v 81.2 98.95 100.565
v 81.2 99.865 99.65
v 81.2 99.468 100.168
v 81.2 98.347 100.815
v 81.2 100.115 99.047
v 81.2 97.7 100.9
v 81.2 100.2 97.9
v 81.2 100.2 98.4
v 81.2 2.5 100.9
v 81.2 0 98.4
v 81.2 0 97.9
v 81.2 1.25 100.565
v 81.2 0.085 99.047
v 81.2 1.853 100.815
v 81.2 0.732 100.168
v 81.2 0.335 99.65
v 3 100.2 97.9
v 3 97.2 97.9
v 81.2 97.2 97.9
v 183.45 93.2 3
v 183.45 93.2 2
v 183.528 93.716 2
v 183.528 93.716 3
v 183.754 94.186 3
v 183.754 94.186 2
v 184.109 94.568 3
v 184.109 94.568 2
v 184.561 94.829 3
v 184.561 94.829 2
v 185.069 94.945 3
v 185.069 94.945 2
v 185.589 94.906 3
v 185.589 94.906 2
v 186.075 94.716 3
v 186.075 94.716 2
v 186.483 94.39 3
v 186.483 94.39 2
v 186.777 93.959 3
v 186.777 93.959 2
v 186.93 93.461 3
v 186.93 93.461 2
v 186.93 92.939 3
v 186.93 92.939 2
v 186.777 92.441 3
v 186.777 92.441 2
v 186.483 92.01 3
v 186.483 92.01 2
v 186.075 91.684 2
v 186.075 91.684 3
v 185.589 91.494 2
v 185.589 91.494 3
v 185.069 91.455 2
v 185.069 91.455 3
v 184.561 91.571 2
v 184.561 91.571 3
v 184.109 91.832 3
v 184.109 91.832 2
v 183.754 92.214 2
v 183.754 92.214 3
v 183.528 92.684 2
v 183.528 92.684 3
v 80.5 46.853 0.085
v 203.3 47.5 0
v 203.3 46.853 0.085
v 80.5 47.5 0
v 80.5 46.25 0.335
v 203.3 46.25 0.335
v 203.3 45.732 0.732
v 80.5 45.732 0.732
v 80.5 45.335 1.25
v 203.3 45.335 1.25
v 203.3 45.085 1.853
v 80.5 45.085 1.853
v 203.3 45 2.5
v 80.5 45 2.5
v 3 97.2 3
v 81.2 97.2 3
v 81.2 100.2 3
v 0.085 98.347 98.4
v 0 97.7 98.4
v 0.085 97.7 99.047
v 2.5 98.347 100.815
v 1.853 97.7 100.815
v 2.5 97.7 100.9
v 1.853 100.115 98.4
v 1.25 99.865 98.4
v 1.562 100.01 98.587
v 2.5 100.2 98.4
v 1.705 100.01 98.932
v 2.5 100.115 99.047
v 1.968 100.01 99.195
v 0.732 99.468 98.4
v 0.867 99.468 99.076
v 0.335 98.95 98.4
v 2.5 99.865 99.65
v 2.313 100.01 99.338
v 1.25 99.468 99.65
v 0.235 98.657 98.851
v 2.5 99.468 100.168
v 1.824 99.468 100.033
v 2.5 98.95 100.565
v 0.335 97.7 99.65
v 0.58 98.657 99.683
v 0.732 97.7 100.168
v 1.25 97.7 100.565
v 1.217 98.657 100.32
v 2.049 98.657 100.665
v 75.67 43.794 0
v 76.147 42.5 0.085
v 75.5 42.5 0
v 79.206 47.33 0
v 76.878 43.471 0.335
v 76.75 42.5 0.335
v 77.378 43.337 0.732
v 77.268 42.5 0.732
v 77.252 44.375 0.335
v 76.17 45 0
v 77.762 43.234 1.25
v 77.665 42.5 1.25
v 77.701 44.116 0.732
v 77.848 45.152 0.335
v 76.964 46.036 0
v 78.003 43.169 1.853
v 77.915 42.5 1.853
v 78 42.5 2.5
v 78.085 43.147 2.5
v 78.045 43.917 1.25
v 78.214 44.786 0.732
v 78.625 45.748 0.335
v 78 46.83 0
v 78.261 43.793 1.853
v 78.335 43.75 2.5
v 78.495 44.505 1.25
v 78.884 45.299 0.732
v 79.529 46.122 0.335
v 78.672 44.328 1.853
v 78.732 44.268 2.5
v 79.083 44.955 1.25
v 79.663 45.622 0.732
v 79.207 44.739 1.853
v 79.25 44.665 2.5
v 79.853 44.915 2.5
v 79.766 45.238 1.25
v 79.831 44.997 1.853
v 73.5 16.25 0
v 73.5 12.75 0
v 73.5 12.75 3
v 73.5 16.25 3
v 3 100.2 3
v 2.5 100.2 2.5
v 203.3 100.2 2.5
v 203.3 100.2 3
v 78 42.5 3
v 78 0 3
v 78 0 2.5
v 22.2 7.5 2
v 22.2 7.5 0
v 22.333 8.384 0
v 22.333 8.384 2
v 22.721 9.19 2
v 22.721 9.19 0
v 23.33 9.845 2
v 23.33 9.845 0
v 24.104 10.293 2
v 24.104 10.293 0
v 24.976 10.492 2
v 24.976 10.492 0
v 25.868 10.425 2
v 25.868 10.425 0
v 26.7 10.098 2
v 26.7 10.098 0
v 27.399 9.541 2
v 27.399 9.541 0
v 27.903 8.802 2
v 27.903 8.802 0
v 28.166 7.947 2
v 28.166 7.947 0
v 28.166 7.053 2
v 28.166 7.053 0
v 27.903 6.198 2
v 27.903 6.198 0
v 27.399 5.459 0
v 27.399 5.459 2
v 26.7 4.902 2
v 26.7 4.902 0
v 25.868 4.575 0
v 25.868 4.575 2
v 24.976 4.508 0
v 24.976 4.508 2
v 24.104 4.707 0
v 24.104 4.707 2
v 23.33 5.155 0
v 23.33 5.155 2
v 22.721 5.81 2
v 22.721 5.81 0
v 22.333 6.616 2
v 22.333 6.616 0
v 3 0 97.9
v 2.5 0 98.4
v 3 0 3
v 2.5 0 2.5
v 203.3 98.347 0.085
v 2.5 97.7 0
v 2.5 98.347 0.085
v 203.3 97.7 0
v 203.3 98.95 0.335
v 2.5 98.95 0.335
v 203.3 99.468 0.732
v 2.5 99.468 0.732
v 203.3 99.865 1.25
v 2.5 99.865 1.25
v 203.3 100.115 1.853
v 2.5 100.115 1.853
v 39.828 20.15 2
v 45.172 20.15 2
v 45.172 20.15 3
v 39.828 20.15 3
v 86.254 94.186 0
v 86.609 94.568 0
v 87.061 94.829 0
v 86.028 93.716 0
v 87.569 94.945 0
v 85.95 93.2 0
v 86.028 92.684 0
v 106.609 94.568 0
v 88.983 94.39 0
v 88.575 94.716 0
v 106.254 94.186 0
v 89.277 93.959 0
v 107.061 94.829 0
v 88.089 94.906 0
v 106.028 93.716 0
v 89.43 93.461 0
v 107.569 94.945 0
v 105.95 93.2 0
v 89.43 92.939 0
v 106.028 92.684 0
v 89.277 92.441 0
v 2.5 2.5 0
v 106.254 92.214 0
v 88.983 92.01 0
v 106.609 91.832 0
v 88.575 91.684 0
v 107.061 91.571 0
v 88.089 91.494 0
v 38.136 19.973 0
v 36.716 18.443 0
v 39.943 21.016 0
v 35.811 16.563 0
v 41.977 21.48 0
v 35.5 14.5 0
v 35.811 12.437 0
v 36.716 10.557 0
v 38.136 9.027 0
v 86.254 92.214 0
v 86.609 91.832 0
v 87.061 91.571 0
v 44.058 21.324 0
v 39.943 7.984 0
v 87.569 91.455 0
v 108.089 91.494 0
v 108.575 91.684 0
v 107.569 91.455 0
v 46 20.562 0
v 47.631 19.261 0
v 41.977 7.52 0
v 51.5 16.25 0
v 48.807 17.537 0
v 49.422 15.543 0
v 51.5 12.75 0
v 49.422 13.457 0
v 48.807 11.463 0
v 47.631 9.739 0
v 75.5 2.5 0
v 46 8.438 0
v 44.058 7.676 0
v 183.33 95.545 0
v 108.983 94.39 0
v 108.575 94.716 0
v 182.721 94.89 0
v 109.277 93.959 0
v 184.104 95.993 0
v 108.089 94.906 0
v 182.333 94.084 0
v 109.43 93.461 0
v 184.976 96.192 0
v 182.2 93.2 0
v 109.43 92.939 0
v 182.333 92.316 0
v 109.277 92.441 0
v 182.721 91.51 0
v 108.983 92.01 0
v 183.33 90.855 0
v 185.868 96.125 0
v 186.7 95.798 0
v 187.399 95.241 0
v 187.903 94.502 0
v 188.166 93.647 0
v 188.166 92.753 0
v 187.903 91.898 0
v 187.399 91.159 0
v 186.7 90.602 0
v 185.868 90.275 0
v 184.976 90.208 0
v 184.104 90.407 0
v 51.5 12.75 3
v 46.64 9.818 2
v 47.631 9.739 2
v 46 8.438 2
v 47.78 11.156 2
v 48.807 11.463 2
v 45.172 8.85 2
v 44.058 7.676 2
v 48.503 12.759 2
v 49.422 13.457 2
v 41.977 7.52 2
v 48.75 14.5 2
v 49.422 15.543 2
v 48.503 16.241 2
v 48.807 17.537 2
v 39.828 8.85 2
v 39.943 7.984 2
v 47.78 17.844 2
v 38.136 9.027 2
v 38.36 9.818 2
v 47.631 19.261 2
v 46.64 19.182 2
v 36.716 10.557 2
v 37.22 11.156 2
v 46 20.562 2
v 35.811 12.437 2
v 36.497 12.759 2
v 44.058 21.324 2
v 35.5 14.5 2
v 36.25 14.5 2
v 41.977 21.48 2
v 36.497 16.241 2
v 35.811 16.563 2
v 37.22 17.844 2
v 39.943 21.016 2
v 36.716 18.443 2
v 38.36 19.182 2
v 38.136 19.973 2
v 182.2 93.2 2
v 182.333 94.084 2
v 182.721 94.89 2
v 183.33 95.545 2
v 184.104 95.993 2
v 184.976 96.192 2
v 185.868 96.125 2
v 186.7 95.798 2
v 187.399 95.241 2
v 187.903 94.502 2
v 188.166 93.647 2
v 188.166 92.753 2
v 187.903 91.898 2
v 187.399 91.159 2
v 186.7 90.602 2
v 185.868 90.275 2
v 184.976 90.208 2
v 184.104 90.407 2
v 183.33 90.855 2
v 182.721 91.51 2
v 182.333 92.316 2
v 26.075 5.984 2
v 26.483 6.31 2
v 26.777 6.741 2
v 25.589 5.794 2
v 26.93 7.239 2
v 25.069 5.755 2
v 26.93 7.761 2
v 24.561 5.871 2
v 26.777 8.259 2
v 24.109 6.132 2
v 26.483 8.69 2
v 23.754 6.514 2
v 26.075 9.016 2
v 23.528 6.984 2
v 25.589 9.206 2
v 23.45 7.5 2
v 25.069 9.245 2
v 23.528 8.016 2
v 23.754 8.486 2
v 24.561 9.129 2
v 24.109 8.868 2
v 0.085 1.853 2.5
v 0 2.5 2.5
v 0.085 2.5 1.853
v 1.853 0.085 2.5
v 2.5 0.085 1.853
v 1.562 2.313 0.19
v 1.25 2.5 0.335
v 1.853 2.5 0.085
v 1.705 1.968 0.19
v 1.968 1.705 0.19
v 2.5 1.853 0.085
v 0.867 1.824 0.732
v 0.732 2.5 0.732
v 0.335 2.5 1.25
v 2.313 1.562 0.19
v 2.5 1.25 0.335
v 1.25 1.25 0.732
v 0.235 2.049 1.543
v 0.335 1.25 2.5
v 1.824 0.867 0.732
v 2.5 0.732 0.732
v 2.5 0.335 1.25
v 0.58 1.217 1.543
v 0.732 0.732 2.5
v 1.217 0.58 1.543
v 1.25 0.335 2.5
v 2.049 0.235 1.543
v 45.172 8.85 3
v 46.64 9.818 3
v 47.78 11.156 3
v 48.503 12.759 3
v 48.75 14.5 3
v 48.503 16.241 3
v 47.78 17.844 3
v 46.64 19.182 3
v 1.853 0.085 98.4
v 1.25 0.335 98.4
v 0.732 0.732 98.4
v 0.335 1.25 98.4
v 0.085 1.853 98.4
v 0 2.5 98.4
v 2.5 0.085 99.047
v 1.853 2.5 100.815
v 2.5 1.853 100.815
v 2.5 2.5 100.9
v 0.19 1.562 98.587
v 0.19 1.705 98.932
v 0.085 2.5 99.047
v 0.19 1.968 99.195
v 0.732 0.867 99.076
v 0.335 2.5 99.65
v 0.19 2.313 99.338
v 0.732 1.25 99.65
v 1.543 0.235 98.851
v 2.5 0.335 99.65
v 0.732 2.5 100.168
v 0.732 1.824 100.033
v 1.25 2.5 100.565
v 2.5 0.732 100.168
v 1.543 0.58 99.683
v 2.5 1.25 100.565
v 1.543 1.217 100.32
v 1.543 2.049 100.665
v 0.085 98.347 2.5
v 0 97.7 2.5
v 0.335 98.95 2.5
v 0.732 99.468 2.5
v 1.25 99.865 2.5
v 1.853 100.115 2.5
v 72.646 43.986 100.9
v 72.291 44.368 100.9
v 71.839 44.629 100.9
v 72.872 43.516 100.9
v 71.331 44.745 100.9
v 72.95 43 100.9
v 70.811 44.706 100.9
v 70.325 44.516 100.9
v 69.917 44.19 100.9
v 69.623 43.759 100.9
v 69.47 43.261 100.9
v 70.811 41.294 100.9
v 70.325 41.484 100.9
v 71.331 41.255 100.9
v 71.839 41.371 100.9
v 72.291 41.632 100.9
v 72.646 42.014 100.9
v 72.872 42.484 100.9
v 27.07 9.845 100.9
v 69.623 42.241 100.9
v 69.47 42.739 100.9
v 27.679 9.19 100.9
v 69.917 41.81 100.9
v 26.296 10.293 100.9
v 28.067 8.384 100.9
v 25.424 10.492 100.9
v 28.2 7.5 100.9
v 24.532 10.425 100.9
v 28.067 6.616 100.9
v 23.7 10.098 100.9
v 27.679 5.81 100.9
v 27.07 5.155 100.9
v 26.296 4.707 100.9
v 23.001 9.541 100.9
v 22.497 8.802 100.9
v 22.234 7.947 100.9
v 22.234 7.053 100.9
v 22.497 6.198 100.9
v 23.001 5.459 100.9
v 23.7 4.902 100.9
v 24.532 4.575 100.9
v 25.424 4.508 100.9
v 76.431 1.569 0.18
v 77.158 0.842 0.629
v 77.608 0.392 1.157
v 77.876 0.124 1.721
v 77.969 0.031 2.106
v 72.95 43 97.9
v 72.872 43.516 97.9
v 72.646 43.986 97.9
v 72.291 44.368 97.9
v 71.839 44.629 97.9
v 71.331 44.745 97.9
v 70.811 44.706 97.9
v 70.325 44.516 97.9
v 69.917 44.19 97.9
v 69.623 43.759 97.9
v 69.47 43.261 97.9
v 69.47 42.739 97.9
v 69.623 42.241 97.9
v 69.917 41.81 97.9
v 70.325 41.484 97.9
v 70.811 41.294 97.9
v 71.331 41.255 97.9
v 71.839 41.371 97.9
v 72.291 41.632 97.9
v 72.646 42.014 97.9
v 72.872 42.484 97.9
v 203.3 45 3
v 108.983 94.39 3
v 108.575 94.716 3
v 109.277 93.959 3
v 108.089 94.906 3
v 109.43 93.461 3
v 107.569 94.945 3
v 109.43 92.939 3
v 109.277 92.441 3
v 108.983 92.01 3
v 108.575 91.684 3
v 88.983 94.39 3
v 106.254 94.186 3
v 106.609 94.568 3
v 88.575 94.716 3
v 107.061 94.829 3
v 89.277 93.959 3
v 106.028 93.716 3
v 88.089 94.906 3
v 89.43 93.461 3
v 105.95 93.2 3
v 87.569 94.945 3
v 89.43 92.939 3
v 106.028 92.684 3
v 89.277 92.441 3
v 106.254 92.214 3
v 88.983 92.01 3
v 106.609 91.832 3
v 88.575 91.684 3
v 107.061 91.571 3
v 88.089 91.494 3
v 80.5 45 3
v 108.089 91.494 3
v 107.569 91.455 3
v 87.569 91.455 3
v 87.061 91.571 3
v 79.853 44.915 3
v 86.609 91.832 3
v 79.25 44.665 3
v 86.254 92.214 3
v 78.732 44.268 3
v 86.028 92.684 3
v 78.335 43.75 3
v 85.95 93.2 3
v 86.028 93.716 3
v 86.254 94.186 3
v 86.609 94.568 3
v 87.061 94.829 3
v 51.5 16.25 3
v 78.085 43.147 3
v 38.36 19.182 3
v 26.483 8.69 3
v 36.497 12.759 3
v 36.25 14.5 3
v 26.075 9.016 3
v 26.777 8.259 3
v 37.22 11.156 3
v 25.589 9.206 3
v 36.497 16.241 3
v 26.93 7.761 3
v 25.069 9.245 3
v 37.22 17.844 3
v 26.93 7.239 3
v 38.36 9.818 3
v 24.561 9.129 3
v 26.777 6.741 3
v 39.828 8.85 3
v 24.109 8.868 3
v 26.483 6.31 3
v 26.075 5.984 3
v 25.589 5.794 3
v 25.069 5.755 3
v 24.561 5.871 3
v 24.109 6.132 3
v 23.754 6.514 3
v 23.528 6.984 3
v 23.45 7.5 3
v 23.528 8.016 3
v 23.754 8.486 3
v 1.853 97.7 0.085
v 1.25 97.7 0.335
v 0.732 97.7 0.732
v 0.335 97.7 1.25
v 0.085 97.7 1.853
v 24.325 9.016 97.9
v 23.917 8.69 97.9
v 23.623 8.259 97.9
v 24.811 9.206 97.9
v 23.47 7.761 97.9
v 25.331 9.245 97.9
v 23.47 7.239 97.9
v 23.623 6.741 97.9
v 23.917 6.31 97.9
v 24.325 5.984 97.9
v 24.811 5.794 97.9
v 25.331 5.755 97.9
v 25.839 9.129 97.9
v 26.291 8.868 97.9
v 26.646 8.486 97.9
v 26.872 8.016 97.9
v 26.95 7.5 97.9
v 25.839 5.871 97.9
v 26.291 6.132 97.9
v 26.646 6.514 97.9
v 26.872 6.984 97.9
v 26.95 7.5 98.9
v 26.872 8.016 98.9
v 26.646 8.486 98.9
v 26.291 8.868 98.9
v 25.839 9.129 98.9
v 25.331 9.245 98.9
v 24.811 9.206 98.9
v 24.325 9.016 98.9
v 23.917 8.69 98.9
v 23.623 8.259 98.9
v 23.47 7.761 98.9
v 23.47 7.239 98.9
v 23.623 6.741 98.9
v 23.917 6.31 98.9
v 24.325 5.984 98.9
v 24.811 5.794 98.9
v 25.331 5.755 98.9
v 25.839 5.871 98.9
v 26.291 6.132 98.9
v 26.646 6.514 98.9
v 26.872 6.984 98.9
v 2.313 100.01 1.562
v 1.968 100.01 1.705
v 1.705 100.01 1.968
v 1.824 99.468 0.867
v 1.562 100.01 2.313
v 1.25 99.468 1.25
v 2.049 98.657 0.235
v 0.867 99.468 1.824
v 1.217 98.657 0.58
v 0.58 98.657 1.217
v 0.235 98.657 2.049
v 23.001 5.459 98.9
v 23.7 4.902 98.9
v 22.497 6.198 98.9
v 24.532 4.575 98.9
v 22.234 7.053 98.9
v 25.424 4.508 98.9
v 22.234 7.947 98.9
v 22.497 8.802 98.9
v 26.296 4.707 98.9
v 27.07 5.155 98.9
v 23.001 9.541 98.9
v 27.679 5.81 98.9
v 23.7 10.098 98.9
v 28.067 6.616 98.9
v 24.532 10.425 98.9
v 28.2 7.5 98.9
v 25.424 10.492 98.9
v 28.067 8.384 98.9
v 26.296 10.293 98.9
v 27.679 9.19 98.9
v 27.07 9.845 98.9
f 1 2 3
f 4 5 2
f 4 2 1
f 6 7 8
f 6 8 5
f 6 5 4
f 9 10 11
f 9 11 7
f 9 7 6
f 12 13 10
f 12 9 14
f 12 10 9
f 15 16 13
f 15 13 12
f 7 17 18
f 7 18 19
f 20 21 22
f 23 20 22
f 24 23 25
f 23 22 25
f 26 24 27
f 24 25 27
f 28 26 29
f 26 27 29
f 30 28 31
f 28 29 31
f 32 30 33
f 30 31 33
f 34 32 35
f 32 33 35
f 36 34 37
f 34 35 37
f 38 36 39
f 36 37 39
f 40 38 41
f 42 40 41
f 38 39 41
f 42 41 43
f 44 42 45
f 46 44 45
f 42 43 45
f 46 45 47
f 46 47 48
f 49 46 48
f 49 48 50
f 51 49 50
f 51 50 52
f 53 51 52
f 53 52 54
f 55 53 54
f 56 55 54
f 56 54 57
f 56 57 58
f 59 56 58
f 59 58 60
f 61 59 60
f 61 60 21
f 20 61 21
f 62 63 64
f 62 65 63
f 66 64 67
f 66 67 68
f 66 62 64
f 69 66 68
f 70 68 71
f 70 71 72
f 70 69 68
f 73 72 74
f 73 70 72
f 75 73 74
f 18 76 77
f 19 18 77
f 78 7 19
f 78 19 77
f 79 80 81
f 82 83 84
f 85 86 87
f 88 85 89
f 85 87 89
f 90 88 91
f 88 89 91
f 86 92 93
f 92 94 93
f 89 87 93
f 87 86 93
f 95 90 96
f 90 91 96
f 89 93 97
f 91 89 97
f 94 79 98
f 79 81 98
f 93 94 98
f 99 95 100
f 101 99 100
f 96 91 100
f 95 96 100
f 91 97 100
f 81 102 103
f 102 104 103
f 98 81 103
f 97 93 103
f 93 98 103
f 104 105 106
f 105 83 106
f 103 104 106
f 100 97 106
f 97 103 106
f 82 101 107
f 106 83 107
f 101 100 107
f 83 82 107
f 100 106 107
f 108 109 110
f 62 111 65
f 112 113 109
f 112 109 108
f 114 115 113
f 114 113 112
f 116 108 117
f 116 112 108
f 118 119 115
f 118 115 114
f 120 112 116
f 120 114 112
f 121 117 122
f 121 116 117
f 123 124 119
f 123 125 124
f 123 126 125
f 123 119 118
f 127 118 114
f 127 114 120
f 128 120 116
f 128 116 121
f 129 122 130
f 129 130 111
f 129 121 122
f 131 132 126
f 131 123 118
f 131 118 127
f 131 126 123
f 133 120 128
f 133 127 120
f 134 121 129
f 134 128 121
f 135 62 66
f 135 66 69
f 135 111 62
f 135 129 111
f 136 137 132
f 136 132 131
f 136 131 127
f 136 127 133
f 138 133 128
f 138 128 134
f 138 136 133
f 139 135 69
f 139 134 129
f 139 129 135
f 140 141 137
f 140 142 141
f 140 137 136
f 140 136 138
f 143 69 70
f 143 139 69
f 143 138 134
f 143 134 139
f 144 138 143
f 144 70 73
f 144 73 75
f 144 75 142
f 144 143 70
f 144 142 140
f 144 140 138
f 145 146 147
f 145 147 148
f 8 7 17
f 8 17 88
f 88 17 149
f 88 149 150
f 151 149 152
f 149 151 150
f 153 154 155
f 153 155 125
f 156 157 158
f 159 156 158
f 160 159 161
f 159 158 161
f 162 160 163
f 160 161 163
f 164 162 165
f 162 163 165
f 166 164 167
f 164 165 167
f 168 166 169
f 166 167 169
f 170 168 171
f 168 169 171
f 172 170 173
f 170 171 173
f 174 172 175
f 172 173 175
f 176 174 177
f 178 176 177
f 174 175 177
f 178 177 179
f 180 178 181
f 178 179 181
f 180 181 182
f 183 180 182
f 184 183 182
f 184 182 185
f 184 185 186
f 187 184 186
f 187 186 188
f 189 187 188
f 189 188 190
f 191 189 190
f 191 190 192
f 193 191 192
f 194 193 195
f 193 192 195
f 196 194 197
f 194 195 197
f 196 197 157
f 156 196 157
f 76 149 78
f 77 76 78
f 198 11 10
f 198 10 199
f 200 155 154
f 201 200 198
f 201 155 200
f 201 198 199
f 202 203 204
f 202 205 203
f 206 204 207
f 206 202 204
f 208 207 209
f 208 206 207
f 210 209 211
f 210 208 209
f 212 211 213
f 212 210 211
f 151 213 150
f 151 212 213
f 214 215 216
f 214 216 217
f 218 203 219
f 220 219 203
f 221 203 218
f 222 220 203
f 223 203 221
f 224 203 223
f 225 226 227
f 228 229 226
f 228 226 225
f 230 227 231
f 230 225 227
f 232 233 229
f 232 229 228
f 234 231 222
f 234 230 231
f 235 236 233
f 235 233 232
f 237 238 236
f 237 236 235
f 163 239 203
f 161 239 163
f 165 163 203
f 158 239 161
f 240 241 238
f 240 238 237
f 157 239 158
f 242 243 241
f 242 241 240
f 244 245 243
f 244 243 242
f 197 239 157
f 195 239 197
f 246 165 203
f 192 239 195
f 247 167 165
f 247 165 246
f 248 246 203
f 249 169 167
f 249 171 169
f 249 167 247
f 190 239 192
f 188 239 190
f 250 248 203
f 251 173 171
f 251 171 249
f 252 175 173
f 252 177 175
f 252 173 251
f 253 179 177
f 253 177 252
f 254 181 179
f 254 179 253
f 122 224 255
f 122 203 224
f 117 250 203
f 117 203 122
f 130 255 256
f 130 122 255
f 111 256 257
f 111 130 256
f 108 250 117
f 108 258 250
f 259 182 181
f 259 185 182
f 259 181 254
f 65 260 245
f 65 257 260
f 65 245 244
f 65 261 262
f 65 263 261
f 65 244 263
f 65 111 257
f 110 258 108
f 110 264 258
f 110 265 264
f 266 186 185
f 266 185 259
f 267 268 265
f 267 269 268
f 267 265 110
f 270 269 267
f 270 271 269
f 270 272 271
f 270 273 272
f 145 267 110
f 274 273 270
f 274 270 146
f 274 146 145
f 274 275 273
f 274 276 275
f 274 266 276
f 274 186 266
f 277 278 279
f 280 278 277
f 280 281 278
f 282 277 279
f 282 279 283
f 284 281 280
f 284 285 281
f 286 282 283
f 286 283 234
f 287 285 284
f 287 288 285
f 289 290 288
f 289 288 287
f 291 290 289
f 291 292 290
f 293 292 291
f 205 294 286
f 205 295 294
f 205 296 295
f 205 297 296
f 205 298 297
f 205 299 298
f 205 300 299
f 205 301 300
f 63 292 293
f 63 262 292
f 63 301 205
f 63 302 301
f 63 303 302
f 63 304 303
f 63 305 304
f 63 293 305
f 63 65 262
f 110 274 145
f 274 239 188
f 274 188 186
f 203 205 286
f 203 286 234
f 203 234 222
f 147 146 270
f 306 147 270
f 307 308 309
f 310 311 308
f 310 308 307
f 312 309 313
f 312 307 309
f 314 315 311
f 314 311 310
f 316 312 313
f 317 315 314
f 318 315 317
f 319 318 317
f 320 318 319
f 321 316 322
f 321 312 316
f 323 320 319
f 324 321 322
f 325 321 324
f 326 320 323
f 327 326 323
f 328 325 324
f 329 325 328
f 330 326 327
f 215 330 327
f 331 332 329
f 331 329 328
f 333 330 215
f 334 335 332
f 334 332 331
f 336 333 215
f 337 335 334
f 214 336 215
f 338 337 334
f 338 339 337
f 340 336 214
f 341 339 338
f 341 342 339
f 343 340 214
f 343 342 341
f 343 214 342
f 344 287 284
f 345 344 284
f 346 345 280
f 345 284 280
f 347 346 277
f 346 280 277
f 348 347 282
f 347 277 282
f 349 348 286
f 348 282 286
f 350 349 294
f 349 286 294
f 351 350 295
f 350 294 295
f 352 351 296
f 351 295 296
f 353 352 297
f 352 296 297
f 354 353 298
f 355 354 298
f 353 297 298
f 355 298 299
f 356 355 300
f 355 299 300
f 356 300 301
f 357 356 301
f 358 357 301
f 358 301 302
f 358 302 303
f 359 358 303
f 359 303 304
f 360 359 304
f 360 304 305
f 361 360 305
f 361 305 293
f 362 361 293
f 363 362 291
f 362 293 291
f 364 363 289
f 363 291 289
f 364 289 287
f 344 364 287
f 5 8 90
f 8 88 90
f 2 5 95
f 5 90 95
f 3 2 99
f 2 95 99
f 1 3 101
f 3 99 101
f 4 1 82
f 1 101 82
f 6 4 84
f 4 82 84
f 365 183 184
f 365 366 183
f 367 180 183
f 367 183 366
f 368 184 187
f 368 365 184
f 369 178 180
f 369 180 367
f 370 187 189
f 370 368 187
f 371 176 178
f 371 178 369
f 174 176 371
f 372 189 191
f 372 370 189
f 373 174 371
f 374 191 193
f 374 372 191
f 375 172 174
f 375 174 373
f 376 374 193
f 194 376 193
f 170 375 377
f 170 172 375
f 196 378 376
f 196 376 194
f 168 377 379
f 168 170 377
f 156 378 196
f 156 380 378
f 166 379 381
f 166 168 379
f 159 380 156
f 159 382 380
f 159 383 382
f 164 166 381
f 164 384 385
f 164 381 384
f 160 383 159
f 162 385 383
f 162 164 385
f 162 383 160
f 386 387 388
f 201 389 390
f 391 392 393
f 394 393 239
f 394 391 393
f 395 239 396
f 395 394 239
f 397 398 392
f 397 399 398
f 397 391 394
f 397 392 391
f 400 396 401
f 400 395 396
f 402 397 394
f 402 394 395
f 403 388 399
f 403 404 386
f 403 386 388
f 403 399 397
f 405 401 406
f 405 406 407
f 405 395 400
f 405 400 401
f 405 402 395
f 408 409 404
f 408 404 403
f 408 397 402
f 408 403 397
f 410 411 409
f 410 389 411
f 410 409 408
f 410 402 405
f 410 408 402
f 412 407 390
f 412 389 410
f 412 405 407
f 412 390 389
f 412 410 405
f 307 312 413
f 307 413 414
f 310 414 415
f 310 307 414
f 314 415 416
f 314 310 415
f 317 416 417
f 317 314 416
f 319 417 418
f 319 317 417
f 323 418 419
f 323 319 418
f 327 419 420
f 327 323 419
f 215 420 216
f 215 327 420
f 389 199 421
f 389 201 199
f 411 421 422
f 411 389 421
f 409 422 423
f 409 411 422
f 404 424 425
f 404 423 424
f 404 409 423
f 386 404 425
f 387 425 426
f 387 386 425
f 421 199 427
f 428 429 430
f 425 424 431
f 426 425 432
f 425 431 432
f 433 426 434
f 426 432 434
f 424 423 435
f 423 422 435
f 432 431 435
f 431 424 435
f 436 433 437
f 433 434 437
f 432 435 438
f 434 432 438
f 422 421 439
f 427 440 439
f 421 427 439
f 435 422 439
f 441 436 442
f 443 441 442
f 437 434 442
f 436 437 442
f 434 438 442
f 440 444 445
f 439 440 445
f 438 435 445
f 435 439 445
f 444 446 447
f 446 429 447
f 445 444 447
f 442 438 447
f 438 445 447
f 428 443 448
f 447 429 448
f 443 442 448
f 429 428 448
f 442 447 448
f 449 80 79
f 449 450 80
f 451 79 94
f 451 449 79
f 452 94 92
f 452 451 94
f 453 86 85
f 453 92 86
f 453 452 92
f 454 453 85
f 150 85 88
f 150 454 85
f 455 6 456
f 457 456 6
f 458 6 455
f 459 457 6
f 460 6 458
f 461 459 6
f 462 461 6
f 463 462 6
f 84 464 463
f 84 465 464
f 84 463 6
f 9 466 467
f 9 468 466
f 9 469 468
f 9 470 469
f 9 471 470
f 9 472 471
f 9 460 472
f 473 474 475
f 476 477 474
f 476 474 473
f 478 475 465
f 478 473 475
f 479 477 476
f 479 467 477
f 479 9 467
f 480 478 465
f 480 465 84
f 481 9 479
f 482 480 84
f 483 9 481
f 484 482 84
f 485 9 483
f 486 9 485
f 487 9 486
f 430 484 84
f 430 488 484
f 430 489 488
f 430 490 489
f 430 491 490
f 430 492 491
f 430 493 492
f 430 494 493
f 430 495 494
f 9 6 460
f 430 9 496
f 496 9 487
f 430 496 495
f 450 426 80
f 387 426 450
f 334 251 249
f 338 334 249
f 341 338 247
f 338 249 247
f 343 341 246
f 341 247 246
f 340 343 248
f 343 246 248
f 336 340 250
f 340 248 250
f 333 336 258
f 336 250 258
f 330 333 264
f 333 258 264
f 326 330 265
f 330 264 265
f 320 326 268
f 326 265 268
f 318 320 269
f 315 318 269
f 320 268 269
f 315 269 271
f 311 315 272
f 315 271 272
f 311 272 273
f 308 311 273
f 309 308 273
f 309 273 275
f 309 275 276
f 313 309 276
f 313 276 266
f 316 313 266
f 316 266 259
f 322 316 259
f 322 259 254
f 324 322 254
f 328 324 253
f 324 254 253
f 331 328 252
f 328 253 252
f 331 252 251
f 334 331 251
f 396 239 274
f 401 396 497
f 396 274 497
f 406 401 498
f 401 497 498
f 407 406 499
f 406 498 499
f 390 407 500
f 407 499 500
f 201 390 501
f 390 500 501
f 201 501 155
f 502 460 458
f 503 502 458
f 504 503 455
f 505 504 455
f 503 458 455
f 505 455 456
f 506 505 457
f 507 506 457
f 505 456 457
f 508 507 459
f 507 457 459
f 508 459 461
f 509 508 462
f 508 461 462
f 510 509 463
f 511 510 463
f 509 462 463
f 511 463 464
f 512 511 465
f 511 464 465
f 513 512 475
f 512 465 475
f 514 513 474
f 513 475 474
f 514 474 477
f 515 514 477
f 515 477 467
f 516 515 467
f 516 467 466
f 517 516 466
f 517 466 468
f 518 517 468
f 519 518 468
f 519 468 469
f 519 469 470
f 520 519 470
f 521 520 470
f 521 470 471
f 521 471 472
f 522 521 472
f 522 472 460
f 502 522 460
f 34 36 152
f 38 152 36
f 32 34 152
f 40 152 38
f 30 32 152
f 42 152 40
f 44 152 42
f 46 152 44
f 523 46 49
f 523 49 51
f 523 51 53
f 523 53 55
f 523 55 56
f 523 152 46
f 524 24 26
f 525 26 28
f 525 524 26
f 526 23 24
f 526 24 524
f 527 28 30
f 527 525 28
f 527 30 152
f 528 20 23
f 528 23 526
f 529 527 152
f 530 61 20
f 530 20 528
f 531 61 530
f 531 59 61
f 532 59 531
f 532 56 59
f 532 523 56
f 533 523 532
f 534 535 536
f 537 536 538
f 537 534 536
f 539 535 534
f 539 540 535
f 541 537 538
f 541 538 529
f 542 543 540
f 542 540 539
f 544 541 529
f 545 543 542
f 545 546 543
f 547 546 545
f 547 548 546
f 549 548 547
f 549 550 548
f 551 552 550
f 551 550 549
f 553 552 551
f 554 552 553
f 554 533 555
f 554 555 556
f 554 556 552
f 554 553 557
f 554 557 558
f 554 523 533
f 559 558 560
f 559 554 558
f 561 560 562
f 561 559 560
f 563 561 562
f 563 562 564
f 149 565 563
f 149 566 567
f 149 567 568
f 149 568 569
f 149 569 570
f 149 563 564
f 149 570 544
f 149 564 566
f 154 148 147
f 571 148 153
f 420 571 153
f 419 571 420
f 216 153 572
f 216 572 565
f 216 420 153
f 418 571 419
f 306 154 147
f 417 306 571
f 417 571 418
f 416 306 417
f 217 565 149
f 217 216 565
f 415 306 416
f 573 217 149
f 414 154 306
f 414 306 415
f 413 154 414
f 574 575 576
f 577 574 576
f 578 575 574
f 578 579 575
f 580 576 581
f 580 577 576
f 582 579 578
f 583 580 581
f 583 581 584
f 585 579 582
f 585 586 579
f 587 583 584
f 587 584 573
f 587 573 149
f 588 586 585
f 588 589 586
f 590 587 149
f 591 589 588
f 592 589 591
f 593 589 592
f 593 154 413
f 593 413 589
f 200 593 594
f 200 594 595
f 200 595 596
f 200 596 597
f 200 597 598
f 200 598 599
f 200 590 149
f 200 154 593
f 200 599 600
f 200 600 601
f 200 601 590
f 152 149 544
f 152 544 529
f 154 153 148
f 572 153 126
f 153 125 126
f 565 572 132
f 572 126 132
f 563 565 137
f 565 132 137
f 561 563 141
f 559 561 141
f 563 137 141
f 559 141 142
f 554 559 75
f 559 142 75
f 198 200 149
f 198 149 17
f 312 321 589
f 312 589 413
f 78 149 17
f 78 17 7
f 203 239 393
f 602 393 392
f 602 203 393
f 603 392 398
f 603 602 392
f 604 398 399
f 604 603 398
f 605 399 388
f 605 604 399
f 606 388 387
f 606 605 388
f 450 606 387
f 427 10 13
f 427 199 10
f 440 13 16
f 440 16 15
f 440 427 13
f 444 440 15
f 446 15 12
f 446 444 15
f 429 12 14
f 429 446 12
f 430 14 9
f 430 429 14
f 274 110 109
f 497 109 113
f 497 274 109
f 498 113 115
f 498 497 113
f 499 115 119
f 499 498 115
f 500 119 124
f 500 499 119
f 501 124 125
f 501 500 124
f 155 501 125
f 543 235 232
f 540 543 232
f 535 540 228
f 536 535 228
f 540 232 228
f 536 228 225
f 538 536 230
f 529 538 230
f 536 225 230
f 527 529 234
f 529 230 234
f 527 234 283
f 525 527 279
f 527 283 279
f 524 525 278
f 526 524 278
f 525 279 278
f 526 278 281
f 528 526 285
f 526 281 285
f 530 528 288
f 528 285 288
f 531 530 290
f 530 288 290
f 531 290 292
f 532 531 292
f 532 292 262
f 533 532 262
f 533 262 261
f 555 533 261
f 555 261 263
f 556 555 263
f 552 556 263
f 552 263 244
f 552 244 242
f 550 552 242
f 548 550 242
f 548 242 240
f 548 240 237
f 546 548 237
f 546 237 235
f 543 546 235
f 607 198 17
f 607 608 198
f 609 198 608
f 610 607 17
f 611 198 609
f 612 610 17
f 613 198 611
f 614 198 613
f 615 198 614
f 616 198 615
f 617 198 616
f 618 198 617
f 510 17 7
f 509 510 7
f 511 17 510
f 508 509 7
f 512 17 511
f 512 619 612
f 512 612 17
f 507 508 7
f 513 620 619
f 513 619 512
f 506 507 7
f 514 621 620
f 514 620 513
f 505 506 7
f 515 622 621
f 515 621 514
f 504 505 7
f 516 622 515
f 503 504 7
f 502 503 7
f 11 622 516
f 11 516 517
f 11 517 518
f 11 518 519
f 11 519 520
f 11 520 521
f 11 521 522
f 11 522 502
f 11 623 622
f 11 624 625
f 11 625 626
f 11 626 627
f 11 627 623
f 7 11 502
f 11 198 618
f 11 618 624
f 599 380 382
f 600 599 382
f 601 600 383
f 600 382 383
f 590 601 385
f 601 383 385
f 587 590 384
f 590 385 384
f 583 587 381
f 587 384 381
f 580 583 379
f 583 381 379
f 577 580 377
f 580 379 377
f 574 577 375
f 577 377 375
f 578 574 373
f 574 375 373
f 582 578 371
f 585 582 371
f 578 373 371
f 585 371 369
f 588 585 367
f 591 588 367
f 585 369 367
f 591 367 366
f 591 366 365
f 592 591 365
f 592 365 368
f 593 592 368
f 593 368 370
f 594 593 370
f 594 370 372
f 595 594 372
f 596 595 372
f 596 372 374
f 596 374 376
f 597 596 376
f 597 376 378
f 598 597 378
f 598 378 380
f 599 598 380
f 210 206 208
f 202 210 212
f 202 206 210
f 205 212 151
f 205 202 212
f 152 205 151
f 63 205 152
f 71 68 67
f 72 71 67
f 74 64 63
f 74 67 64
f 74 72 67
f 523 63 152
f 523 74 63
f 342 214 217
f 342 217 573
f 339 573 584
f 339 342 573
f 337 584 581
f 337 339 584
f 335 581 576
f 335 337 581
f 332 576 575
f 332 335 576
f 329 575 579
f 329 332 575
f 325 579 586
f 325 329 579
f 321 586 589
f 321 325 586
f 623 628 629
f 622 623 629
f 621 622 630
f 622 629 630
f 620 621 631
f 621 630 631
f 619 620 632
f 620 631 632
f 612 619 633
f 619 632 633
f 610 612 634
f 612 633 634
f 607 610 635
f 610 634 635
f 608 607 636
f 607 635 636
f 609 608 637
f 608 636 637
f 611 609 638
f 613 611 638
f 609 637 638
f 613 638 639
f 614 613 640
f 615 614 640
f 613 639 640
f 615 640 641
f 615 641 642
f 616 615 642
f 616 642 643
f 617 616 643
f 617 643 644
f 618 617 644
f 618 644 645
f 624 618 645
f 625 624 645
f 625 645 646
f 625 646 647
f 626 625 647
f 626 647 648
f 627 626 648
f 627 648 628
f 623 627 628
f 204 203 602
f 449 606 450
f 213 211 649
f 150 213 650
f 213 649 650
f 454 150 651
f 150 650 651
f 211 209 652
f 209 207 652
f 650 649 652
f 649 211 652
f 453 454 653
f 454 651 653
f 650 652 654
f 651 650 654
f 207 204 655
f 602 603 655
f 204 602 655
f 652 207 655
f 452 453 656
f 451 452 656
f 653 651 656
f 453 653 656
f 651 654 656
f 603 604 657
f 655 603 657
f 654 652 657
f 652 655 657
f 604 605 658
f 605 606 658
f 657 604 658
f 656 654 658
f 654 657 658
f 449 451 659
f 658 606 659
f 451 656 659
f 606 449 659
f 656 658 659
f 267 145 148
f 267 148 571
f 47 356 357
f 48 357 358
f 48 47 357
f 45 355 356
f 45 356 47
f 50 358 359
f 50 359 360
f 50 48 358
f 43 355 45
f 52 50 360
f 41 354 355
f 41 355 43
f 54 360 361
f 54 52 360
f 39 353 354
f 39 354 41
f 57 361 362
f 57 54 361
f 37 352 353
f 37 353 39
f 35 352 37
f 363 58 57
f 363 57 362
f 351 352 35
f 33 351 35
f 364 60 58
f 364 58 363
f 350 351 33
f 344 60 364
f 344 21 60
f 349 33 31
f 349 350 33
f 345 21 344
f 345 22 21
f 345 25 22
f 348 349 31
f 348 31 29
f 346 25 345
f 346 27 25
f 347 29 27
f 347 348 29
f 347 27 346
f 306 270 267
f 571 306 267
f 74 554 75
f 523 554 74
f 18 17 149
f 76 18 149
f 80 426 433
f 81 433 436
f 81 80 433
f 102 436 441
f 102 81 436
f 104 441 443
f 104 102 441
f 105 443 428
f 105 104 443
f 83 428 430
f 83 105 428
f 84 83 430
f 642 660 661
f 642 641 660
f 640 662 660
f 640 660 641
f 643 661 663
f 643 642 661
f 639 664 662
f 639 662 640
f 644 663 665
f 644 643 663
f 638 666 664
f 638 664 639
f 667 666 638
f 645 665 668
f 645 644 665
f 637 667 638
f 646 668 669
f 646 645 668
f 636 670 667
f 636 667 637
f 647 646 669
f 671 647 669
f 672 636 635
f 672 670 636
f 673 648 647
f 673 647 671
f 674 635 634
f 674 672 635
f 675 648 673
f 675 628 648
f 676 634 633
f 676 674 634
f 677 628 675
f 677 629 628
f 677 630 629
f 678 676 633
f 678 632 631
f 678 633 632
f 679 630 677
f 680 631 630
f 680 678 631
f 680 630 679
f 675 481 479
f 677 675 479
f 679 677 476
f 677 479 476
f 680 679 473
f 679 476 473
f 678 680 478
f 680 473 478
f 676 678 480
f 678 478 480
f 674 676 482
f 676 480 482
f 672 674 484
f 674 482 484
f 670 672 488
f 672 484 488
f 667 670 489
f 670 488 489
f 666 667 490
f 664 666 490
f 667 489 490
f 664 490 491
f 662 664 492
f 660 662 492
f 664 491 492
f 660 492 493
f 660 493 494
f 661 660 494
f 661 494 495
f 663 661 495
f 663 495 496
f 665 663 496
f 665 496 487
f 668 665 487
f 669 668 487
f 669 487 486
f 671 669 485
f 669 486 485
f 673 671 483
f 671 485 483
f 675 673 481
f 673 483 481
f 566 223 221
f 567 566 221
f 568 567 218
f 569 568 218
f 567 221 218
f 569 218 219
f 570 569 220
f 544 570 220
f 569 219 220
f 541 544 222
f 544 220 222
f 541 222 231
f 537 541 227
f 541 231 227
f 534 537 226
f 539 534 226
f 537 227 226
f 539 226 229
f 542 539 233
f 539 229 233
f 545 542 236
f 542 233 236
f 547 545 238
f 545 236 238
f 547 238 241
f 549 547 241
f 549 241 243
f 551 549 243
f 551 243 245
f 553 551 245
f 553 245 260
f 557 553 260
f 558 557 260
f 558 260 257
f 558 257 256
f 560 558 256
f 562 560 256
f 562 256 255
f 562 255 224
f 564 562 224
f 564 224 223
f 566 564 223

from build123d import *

# Parameters (mm, degrees)
MAIN_BODY_DEPTH                  = 100.2
SKETCH5_R                        = 1.75
BACK_SCREW_HOLES_DEPTH           = 10
SKETCH12_R                       = 3
BACK_SCREW_HEADS_DEPTH           = 2
SKETCH6_W                        = 220
SKETCH6_H                        = 45
PAPER_THROUGH_HOLE_DEPTH         = 10
SKETCH7_R                        = 1.75
FRONT_LEFT_SCREW_HOLE_DEPTH      = 10
SKETCH8_R                        = 3
FRONT_LEFT_SCREW_HEAD_DEPTH      = 2
SKETCH9_W                        = 78.2
SKETCH9_H                        = 94.9
BOSS_EXTRUDE1_DEPTH              = 3
SKETCH10_R                       = 1.75
HINGE_HOLES_DEPTH                = 10
SKETCH11_R                       = 1.75
LATCH_HOLE_DEPTH                 = 10
FILLET3_R                        = 2.5
SKETCH13_R                       = 7
BARRE_JACK_OUTER_CUTOUT_DEPTH    = 2
BARREL_JACK_INNER_CUTOUT_DEPTH   = 1
SKETCH15_W                       = 22
SKETCH15_H                       = 3.5
KEYBOARD_CABLE_PASSTHROUGH_DEPTH = 3


with BuildPart() as part:
    # Sketch1 → Main_Body (new body)
    with BuildSketch(Plane(origin=(0, 0, 0), x_dir=(1, 0, 0), z_dir=(0, 1, 0))):
        Polygon((0, 0), (203.3, 0), (203.3, -3), (3, -3), (3, -97.9), (81.2, -97.9), (81.2, -100.9), (0, -100.9), align=None)
    extrude(amount=MAIN_BODY_DEPTH)

    # Sketch5 → Back_Screw_Holes (cut)
    with BuildSketch(Plane(origin=(0, 0, 0), x_dir=(-1, 0, 0), z_dir=(0, 0, -1))):
        with Locations((-25.2, 7.5)):
            Circle(SKETCH5_R)
        with Locations((-185.2, 7.5)):
            Circle(SKETCH5_R)
        with Locations((-185.2, 93.2)):
            Circle(SKETCH5_R)
    extrude(amount=-BACK_SCREW_HOLES_DEPTH, mode=Mode.SUBTRACT)

    # Sketch12 → Back_Screw_Heads (cut)
    with BuildSketch(Plane(origin=(0, 0, 0), x_dir=(-1, 0, 0), z_dir=(0, 0, -1))):
        with Locations((-25.2, 7.5)):
            Circle(SKETCH12_R)
        with Locations((-185.2, 7.5)):
            Circle(SKETCH12_R)
        with Locations((-185.2, 93.2)):
            Circle(SKETCH12_R)
    extrude(amount=-BACK_SCREW_HEADS_DEPTH, mode=Mode.SUBTRACT)

    # Sketch6 → Paper_Through_Hole (cut)
    with BuildSketch(Plane.XY.offset(3)):
        with Locations((188, 22.5)):
            Rectangle(SKETCH6_W, SKETCH6_H)
    extrude(amount=-PAPER_THROUGH_HOLE_DEPTH, mode=Mode.SUBTRACT)

    # Sketch7 → Front_Left_Screw_Hole (cut)
    with BuildSketch(Plane.XY.offset(100.9)):
        with Locations((25.2, 7.5)):
            Circle(SKETCH7_R)
    extrude(amount=-FRONT_LEFT_SCREW_HOLE_DEPTH, mode=Mode.SUBTRACT)

    # Sketch8 → Front_Left_Screw_Head (cut)
    with BuildSketch(Plane.XY.offset(100.9)):
        with Locations((25.2, 7.5)):
            Circle(SKETCH8_R)
    extrude(amount=-FRONT_LEFT_SCREW_HEAD_DEPTH, mode=Mode.SUBTRACT)

    # Sketch10 → Hinge_Holes (cut)
    with BuildSketch(Plane(origin=(0, 0, 0), x_dir=(-1, 0, 0), z_dir=(0, 0, -1))):
        with Locations((-107.7, 93.2)):
            Circle(SKETCH10_R)
        with Locations((-87.7, 93.2)):
            Circle(SKETCH10_R)
    extrude(amount=-HINGE_HOLES_DEPTH, mode=Mode.SUBTRACT)

    # Sketch11 → Latch_Hole (cut)
    with BuildSketch(Plane.XY.offset(100.9)):
        with Locations((71.2, 43)):
            Circle(SKETCH11_R)
    extrude(amount=-LATCH_HOLE_DEPTH, mode=Mode.SUBTRACT)

    # Fillet3
    fillet3_edges = [part.edges().sort_by_distance(p)[0] for p in [
        (40.6, 0, 100.9),
        (0, 0, 50.45),
        (0, 50.1, 0),
        (0, 50.1, 100.9),
        (101.65, 100.2, 0),
        (0, 100.2, 50.45),
        (39, 0, 0),
        (140.65, 45, 0),
        (78, 45, 1.5),
        (78, 22.5, 0),
        (40.6, 100.2, 100.9),
    ]]
    fillet(fillet3_edges, radius=FILLET3_R)

    # Sketch13 → Barre_Jack_Outer_Cutout (cut)
    with BuildSketch(Plane(origin=(0, 0, 0), x_dir=(-1, 0, 0), z_dir=(0, 0, -1))):
        with Locations((-42.5, 14.5)):
            Circle(SKETCH13_R)
    extrude(amount=-BARRE_JACK_OUTER_CUTOUT_DEPTH, mode=Mode.SUBTRACT)

    # Sketch14 → Barrel_Jack_Inner_Cutout (cut)
    with BuildSketch(Plane(origin=(0, 0, 2), x_dir=(-1, 0, 0), z_dir=(0, 0, -1))):
        with BuildLine():
            Line((-45.172077843, 20.15), (-39.827922157, 20.15))
            ThreePointArc((-39.827922157, 20.15), (-36.25, 14.5), (-39.827922157, 8.85))
            Line((-39.827922157, 8.85), (-45.172077843, 8.85))
            ThreePointArc((-45.172077843, 8.85), (-48.75, 14.5), (-45.172077843, 20.15))
        make_face()
    extrude(amount=-BARREL_JACK_INNER_CUTOUT_DEPTH, mode=Mode.SUBTRACT)

    # Sketch15 → Keyboard_Cable_Passthrough (cut)
    with BuildSketch(Plane(origin=(0, 0, 0), x_dir=(-1, 0, 0), z_dir=(0, 0, -1))):
        with Locations((-62.5, 14.5)):
            Rectangle(SKETCH15_W, SKETCH15_H)
    extrude(amount=-KEYBOARD_CABLE_PASSTHROUGH_DEPTH, mode=Mode.SUBTRACT)


with BuildPart() as body_2:
    # Sketch9 → Boss-Extrude1 (new body)
    with BuildSketch(Plane(origin=(0, 100.2, 0), x_dir=(1, 0, 0), z_dir=(0, 1, 0))):
        with Locations((42.1, -50.45)):
            Rectangle(SKETCH9_W, SKETCH9_H)
    extrude(amount=-BOSS_EXTRUDE1_DEPTH)


solid = Compound([part.part, body_2.part])
